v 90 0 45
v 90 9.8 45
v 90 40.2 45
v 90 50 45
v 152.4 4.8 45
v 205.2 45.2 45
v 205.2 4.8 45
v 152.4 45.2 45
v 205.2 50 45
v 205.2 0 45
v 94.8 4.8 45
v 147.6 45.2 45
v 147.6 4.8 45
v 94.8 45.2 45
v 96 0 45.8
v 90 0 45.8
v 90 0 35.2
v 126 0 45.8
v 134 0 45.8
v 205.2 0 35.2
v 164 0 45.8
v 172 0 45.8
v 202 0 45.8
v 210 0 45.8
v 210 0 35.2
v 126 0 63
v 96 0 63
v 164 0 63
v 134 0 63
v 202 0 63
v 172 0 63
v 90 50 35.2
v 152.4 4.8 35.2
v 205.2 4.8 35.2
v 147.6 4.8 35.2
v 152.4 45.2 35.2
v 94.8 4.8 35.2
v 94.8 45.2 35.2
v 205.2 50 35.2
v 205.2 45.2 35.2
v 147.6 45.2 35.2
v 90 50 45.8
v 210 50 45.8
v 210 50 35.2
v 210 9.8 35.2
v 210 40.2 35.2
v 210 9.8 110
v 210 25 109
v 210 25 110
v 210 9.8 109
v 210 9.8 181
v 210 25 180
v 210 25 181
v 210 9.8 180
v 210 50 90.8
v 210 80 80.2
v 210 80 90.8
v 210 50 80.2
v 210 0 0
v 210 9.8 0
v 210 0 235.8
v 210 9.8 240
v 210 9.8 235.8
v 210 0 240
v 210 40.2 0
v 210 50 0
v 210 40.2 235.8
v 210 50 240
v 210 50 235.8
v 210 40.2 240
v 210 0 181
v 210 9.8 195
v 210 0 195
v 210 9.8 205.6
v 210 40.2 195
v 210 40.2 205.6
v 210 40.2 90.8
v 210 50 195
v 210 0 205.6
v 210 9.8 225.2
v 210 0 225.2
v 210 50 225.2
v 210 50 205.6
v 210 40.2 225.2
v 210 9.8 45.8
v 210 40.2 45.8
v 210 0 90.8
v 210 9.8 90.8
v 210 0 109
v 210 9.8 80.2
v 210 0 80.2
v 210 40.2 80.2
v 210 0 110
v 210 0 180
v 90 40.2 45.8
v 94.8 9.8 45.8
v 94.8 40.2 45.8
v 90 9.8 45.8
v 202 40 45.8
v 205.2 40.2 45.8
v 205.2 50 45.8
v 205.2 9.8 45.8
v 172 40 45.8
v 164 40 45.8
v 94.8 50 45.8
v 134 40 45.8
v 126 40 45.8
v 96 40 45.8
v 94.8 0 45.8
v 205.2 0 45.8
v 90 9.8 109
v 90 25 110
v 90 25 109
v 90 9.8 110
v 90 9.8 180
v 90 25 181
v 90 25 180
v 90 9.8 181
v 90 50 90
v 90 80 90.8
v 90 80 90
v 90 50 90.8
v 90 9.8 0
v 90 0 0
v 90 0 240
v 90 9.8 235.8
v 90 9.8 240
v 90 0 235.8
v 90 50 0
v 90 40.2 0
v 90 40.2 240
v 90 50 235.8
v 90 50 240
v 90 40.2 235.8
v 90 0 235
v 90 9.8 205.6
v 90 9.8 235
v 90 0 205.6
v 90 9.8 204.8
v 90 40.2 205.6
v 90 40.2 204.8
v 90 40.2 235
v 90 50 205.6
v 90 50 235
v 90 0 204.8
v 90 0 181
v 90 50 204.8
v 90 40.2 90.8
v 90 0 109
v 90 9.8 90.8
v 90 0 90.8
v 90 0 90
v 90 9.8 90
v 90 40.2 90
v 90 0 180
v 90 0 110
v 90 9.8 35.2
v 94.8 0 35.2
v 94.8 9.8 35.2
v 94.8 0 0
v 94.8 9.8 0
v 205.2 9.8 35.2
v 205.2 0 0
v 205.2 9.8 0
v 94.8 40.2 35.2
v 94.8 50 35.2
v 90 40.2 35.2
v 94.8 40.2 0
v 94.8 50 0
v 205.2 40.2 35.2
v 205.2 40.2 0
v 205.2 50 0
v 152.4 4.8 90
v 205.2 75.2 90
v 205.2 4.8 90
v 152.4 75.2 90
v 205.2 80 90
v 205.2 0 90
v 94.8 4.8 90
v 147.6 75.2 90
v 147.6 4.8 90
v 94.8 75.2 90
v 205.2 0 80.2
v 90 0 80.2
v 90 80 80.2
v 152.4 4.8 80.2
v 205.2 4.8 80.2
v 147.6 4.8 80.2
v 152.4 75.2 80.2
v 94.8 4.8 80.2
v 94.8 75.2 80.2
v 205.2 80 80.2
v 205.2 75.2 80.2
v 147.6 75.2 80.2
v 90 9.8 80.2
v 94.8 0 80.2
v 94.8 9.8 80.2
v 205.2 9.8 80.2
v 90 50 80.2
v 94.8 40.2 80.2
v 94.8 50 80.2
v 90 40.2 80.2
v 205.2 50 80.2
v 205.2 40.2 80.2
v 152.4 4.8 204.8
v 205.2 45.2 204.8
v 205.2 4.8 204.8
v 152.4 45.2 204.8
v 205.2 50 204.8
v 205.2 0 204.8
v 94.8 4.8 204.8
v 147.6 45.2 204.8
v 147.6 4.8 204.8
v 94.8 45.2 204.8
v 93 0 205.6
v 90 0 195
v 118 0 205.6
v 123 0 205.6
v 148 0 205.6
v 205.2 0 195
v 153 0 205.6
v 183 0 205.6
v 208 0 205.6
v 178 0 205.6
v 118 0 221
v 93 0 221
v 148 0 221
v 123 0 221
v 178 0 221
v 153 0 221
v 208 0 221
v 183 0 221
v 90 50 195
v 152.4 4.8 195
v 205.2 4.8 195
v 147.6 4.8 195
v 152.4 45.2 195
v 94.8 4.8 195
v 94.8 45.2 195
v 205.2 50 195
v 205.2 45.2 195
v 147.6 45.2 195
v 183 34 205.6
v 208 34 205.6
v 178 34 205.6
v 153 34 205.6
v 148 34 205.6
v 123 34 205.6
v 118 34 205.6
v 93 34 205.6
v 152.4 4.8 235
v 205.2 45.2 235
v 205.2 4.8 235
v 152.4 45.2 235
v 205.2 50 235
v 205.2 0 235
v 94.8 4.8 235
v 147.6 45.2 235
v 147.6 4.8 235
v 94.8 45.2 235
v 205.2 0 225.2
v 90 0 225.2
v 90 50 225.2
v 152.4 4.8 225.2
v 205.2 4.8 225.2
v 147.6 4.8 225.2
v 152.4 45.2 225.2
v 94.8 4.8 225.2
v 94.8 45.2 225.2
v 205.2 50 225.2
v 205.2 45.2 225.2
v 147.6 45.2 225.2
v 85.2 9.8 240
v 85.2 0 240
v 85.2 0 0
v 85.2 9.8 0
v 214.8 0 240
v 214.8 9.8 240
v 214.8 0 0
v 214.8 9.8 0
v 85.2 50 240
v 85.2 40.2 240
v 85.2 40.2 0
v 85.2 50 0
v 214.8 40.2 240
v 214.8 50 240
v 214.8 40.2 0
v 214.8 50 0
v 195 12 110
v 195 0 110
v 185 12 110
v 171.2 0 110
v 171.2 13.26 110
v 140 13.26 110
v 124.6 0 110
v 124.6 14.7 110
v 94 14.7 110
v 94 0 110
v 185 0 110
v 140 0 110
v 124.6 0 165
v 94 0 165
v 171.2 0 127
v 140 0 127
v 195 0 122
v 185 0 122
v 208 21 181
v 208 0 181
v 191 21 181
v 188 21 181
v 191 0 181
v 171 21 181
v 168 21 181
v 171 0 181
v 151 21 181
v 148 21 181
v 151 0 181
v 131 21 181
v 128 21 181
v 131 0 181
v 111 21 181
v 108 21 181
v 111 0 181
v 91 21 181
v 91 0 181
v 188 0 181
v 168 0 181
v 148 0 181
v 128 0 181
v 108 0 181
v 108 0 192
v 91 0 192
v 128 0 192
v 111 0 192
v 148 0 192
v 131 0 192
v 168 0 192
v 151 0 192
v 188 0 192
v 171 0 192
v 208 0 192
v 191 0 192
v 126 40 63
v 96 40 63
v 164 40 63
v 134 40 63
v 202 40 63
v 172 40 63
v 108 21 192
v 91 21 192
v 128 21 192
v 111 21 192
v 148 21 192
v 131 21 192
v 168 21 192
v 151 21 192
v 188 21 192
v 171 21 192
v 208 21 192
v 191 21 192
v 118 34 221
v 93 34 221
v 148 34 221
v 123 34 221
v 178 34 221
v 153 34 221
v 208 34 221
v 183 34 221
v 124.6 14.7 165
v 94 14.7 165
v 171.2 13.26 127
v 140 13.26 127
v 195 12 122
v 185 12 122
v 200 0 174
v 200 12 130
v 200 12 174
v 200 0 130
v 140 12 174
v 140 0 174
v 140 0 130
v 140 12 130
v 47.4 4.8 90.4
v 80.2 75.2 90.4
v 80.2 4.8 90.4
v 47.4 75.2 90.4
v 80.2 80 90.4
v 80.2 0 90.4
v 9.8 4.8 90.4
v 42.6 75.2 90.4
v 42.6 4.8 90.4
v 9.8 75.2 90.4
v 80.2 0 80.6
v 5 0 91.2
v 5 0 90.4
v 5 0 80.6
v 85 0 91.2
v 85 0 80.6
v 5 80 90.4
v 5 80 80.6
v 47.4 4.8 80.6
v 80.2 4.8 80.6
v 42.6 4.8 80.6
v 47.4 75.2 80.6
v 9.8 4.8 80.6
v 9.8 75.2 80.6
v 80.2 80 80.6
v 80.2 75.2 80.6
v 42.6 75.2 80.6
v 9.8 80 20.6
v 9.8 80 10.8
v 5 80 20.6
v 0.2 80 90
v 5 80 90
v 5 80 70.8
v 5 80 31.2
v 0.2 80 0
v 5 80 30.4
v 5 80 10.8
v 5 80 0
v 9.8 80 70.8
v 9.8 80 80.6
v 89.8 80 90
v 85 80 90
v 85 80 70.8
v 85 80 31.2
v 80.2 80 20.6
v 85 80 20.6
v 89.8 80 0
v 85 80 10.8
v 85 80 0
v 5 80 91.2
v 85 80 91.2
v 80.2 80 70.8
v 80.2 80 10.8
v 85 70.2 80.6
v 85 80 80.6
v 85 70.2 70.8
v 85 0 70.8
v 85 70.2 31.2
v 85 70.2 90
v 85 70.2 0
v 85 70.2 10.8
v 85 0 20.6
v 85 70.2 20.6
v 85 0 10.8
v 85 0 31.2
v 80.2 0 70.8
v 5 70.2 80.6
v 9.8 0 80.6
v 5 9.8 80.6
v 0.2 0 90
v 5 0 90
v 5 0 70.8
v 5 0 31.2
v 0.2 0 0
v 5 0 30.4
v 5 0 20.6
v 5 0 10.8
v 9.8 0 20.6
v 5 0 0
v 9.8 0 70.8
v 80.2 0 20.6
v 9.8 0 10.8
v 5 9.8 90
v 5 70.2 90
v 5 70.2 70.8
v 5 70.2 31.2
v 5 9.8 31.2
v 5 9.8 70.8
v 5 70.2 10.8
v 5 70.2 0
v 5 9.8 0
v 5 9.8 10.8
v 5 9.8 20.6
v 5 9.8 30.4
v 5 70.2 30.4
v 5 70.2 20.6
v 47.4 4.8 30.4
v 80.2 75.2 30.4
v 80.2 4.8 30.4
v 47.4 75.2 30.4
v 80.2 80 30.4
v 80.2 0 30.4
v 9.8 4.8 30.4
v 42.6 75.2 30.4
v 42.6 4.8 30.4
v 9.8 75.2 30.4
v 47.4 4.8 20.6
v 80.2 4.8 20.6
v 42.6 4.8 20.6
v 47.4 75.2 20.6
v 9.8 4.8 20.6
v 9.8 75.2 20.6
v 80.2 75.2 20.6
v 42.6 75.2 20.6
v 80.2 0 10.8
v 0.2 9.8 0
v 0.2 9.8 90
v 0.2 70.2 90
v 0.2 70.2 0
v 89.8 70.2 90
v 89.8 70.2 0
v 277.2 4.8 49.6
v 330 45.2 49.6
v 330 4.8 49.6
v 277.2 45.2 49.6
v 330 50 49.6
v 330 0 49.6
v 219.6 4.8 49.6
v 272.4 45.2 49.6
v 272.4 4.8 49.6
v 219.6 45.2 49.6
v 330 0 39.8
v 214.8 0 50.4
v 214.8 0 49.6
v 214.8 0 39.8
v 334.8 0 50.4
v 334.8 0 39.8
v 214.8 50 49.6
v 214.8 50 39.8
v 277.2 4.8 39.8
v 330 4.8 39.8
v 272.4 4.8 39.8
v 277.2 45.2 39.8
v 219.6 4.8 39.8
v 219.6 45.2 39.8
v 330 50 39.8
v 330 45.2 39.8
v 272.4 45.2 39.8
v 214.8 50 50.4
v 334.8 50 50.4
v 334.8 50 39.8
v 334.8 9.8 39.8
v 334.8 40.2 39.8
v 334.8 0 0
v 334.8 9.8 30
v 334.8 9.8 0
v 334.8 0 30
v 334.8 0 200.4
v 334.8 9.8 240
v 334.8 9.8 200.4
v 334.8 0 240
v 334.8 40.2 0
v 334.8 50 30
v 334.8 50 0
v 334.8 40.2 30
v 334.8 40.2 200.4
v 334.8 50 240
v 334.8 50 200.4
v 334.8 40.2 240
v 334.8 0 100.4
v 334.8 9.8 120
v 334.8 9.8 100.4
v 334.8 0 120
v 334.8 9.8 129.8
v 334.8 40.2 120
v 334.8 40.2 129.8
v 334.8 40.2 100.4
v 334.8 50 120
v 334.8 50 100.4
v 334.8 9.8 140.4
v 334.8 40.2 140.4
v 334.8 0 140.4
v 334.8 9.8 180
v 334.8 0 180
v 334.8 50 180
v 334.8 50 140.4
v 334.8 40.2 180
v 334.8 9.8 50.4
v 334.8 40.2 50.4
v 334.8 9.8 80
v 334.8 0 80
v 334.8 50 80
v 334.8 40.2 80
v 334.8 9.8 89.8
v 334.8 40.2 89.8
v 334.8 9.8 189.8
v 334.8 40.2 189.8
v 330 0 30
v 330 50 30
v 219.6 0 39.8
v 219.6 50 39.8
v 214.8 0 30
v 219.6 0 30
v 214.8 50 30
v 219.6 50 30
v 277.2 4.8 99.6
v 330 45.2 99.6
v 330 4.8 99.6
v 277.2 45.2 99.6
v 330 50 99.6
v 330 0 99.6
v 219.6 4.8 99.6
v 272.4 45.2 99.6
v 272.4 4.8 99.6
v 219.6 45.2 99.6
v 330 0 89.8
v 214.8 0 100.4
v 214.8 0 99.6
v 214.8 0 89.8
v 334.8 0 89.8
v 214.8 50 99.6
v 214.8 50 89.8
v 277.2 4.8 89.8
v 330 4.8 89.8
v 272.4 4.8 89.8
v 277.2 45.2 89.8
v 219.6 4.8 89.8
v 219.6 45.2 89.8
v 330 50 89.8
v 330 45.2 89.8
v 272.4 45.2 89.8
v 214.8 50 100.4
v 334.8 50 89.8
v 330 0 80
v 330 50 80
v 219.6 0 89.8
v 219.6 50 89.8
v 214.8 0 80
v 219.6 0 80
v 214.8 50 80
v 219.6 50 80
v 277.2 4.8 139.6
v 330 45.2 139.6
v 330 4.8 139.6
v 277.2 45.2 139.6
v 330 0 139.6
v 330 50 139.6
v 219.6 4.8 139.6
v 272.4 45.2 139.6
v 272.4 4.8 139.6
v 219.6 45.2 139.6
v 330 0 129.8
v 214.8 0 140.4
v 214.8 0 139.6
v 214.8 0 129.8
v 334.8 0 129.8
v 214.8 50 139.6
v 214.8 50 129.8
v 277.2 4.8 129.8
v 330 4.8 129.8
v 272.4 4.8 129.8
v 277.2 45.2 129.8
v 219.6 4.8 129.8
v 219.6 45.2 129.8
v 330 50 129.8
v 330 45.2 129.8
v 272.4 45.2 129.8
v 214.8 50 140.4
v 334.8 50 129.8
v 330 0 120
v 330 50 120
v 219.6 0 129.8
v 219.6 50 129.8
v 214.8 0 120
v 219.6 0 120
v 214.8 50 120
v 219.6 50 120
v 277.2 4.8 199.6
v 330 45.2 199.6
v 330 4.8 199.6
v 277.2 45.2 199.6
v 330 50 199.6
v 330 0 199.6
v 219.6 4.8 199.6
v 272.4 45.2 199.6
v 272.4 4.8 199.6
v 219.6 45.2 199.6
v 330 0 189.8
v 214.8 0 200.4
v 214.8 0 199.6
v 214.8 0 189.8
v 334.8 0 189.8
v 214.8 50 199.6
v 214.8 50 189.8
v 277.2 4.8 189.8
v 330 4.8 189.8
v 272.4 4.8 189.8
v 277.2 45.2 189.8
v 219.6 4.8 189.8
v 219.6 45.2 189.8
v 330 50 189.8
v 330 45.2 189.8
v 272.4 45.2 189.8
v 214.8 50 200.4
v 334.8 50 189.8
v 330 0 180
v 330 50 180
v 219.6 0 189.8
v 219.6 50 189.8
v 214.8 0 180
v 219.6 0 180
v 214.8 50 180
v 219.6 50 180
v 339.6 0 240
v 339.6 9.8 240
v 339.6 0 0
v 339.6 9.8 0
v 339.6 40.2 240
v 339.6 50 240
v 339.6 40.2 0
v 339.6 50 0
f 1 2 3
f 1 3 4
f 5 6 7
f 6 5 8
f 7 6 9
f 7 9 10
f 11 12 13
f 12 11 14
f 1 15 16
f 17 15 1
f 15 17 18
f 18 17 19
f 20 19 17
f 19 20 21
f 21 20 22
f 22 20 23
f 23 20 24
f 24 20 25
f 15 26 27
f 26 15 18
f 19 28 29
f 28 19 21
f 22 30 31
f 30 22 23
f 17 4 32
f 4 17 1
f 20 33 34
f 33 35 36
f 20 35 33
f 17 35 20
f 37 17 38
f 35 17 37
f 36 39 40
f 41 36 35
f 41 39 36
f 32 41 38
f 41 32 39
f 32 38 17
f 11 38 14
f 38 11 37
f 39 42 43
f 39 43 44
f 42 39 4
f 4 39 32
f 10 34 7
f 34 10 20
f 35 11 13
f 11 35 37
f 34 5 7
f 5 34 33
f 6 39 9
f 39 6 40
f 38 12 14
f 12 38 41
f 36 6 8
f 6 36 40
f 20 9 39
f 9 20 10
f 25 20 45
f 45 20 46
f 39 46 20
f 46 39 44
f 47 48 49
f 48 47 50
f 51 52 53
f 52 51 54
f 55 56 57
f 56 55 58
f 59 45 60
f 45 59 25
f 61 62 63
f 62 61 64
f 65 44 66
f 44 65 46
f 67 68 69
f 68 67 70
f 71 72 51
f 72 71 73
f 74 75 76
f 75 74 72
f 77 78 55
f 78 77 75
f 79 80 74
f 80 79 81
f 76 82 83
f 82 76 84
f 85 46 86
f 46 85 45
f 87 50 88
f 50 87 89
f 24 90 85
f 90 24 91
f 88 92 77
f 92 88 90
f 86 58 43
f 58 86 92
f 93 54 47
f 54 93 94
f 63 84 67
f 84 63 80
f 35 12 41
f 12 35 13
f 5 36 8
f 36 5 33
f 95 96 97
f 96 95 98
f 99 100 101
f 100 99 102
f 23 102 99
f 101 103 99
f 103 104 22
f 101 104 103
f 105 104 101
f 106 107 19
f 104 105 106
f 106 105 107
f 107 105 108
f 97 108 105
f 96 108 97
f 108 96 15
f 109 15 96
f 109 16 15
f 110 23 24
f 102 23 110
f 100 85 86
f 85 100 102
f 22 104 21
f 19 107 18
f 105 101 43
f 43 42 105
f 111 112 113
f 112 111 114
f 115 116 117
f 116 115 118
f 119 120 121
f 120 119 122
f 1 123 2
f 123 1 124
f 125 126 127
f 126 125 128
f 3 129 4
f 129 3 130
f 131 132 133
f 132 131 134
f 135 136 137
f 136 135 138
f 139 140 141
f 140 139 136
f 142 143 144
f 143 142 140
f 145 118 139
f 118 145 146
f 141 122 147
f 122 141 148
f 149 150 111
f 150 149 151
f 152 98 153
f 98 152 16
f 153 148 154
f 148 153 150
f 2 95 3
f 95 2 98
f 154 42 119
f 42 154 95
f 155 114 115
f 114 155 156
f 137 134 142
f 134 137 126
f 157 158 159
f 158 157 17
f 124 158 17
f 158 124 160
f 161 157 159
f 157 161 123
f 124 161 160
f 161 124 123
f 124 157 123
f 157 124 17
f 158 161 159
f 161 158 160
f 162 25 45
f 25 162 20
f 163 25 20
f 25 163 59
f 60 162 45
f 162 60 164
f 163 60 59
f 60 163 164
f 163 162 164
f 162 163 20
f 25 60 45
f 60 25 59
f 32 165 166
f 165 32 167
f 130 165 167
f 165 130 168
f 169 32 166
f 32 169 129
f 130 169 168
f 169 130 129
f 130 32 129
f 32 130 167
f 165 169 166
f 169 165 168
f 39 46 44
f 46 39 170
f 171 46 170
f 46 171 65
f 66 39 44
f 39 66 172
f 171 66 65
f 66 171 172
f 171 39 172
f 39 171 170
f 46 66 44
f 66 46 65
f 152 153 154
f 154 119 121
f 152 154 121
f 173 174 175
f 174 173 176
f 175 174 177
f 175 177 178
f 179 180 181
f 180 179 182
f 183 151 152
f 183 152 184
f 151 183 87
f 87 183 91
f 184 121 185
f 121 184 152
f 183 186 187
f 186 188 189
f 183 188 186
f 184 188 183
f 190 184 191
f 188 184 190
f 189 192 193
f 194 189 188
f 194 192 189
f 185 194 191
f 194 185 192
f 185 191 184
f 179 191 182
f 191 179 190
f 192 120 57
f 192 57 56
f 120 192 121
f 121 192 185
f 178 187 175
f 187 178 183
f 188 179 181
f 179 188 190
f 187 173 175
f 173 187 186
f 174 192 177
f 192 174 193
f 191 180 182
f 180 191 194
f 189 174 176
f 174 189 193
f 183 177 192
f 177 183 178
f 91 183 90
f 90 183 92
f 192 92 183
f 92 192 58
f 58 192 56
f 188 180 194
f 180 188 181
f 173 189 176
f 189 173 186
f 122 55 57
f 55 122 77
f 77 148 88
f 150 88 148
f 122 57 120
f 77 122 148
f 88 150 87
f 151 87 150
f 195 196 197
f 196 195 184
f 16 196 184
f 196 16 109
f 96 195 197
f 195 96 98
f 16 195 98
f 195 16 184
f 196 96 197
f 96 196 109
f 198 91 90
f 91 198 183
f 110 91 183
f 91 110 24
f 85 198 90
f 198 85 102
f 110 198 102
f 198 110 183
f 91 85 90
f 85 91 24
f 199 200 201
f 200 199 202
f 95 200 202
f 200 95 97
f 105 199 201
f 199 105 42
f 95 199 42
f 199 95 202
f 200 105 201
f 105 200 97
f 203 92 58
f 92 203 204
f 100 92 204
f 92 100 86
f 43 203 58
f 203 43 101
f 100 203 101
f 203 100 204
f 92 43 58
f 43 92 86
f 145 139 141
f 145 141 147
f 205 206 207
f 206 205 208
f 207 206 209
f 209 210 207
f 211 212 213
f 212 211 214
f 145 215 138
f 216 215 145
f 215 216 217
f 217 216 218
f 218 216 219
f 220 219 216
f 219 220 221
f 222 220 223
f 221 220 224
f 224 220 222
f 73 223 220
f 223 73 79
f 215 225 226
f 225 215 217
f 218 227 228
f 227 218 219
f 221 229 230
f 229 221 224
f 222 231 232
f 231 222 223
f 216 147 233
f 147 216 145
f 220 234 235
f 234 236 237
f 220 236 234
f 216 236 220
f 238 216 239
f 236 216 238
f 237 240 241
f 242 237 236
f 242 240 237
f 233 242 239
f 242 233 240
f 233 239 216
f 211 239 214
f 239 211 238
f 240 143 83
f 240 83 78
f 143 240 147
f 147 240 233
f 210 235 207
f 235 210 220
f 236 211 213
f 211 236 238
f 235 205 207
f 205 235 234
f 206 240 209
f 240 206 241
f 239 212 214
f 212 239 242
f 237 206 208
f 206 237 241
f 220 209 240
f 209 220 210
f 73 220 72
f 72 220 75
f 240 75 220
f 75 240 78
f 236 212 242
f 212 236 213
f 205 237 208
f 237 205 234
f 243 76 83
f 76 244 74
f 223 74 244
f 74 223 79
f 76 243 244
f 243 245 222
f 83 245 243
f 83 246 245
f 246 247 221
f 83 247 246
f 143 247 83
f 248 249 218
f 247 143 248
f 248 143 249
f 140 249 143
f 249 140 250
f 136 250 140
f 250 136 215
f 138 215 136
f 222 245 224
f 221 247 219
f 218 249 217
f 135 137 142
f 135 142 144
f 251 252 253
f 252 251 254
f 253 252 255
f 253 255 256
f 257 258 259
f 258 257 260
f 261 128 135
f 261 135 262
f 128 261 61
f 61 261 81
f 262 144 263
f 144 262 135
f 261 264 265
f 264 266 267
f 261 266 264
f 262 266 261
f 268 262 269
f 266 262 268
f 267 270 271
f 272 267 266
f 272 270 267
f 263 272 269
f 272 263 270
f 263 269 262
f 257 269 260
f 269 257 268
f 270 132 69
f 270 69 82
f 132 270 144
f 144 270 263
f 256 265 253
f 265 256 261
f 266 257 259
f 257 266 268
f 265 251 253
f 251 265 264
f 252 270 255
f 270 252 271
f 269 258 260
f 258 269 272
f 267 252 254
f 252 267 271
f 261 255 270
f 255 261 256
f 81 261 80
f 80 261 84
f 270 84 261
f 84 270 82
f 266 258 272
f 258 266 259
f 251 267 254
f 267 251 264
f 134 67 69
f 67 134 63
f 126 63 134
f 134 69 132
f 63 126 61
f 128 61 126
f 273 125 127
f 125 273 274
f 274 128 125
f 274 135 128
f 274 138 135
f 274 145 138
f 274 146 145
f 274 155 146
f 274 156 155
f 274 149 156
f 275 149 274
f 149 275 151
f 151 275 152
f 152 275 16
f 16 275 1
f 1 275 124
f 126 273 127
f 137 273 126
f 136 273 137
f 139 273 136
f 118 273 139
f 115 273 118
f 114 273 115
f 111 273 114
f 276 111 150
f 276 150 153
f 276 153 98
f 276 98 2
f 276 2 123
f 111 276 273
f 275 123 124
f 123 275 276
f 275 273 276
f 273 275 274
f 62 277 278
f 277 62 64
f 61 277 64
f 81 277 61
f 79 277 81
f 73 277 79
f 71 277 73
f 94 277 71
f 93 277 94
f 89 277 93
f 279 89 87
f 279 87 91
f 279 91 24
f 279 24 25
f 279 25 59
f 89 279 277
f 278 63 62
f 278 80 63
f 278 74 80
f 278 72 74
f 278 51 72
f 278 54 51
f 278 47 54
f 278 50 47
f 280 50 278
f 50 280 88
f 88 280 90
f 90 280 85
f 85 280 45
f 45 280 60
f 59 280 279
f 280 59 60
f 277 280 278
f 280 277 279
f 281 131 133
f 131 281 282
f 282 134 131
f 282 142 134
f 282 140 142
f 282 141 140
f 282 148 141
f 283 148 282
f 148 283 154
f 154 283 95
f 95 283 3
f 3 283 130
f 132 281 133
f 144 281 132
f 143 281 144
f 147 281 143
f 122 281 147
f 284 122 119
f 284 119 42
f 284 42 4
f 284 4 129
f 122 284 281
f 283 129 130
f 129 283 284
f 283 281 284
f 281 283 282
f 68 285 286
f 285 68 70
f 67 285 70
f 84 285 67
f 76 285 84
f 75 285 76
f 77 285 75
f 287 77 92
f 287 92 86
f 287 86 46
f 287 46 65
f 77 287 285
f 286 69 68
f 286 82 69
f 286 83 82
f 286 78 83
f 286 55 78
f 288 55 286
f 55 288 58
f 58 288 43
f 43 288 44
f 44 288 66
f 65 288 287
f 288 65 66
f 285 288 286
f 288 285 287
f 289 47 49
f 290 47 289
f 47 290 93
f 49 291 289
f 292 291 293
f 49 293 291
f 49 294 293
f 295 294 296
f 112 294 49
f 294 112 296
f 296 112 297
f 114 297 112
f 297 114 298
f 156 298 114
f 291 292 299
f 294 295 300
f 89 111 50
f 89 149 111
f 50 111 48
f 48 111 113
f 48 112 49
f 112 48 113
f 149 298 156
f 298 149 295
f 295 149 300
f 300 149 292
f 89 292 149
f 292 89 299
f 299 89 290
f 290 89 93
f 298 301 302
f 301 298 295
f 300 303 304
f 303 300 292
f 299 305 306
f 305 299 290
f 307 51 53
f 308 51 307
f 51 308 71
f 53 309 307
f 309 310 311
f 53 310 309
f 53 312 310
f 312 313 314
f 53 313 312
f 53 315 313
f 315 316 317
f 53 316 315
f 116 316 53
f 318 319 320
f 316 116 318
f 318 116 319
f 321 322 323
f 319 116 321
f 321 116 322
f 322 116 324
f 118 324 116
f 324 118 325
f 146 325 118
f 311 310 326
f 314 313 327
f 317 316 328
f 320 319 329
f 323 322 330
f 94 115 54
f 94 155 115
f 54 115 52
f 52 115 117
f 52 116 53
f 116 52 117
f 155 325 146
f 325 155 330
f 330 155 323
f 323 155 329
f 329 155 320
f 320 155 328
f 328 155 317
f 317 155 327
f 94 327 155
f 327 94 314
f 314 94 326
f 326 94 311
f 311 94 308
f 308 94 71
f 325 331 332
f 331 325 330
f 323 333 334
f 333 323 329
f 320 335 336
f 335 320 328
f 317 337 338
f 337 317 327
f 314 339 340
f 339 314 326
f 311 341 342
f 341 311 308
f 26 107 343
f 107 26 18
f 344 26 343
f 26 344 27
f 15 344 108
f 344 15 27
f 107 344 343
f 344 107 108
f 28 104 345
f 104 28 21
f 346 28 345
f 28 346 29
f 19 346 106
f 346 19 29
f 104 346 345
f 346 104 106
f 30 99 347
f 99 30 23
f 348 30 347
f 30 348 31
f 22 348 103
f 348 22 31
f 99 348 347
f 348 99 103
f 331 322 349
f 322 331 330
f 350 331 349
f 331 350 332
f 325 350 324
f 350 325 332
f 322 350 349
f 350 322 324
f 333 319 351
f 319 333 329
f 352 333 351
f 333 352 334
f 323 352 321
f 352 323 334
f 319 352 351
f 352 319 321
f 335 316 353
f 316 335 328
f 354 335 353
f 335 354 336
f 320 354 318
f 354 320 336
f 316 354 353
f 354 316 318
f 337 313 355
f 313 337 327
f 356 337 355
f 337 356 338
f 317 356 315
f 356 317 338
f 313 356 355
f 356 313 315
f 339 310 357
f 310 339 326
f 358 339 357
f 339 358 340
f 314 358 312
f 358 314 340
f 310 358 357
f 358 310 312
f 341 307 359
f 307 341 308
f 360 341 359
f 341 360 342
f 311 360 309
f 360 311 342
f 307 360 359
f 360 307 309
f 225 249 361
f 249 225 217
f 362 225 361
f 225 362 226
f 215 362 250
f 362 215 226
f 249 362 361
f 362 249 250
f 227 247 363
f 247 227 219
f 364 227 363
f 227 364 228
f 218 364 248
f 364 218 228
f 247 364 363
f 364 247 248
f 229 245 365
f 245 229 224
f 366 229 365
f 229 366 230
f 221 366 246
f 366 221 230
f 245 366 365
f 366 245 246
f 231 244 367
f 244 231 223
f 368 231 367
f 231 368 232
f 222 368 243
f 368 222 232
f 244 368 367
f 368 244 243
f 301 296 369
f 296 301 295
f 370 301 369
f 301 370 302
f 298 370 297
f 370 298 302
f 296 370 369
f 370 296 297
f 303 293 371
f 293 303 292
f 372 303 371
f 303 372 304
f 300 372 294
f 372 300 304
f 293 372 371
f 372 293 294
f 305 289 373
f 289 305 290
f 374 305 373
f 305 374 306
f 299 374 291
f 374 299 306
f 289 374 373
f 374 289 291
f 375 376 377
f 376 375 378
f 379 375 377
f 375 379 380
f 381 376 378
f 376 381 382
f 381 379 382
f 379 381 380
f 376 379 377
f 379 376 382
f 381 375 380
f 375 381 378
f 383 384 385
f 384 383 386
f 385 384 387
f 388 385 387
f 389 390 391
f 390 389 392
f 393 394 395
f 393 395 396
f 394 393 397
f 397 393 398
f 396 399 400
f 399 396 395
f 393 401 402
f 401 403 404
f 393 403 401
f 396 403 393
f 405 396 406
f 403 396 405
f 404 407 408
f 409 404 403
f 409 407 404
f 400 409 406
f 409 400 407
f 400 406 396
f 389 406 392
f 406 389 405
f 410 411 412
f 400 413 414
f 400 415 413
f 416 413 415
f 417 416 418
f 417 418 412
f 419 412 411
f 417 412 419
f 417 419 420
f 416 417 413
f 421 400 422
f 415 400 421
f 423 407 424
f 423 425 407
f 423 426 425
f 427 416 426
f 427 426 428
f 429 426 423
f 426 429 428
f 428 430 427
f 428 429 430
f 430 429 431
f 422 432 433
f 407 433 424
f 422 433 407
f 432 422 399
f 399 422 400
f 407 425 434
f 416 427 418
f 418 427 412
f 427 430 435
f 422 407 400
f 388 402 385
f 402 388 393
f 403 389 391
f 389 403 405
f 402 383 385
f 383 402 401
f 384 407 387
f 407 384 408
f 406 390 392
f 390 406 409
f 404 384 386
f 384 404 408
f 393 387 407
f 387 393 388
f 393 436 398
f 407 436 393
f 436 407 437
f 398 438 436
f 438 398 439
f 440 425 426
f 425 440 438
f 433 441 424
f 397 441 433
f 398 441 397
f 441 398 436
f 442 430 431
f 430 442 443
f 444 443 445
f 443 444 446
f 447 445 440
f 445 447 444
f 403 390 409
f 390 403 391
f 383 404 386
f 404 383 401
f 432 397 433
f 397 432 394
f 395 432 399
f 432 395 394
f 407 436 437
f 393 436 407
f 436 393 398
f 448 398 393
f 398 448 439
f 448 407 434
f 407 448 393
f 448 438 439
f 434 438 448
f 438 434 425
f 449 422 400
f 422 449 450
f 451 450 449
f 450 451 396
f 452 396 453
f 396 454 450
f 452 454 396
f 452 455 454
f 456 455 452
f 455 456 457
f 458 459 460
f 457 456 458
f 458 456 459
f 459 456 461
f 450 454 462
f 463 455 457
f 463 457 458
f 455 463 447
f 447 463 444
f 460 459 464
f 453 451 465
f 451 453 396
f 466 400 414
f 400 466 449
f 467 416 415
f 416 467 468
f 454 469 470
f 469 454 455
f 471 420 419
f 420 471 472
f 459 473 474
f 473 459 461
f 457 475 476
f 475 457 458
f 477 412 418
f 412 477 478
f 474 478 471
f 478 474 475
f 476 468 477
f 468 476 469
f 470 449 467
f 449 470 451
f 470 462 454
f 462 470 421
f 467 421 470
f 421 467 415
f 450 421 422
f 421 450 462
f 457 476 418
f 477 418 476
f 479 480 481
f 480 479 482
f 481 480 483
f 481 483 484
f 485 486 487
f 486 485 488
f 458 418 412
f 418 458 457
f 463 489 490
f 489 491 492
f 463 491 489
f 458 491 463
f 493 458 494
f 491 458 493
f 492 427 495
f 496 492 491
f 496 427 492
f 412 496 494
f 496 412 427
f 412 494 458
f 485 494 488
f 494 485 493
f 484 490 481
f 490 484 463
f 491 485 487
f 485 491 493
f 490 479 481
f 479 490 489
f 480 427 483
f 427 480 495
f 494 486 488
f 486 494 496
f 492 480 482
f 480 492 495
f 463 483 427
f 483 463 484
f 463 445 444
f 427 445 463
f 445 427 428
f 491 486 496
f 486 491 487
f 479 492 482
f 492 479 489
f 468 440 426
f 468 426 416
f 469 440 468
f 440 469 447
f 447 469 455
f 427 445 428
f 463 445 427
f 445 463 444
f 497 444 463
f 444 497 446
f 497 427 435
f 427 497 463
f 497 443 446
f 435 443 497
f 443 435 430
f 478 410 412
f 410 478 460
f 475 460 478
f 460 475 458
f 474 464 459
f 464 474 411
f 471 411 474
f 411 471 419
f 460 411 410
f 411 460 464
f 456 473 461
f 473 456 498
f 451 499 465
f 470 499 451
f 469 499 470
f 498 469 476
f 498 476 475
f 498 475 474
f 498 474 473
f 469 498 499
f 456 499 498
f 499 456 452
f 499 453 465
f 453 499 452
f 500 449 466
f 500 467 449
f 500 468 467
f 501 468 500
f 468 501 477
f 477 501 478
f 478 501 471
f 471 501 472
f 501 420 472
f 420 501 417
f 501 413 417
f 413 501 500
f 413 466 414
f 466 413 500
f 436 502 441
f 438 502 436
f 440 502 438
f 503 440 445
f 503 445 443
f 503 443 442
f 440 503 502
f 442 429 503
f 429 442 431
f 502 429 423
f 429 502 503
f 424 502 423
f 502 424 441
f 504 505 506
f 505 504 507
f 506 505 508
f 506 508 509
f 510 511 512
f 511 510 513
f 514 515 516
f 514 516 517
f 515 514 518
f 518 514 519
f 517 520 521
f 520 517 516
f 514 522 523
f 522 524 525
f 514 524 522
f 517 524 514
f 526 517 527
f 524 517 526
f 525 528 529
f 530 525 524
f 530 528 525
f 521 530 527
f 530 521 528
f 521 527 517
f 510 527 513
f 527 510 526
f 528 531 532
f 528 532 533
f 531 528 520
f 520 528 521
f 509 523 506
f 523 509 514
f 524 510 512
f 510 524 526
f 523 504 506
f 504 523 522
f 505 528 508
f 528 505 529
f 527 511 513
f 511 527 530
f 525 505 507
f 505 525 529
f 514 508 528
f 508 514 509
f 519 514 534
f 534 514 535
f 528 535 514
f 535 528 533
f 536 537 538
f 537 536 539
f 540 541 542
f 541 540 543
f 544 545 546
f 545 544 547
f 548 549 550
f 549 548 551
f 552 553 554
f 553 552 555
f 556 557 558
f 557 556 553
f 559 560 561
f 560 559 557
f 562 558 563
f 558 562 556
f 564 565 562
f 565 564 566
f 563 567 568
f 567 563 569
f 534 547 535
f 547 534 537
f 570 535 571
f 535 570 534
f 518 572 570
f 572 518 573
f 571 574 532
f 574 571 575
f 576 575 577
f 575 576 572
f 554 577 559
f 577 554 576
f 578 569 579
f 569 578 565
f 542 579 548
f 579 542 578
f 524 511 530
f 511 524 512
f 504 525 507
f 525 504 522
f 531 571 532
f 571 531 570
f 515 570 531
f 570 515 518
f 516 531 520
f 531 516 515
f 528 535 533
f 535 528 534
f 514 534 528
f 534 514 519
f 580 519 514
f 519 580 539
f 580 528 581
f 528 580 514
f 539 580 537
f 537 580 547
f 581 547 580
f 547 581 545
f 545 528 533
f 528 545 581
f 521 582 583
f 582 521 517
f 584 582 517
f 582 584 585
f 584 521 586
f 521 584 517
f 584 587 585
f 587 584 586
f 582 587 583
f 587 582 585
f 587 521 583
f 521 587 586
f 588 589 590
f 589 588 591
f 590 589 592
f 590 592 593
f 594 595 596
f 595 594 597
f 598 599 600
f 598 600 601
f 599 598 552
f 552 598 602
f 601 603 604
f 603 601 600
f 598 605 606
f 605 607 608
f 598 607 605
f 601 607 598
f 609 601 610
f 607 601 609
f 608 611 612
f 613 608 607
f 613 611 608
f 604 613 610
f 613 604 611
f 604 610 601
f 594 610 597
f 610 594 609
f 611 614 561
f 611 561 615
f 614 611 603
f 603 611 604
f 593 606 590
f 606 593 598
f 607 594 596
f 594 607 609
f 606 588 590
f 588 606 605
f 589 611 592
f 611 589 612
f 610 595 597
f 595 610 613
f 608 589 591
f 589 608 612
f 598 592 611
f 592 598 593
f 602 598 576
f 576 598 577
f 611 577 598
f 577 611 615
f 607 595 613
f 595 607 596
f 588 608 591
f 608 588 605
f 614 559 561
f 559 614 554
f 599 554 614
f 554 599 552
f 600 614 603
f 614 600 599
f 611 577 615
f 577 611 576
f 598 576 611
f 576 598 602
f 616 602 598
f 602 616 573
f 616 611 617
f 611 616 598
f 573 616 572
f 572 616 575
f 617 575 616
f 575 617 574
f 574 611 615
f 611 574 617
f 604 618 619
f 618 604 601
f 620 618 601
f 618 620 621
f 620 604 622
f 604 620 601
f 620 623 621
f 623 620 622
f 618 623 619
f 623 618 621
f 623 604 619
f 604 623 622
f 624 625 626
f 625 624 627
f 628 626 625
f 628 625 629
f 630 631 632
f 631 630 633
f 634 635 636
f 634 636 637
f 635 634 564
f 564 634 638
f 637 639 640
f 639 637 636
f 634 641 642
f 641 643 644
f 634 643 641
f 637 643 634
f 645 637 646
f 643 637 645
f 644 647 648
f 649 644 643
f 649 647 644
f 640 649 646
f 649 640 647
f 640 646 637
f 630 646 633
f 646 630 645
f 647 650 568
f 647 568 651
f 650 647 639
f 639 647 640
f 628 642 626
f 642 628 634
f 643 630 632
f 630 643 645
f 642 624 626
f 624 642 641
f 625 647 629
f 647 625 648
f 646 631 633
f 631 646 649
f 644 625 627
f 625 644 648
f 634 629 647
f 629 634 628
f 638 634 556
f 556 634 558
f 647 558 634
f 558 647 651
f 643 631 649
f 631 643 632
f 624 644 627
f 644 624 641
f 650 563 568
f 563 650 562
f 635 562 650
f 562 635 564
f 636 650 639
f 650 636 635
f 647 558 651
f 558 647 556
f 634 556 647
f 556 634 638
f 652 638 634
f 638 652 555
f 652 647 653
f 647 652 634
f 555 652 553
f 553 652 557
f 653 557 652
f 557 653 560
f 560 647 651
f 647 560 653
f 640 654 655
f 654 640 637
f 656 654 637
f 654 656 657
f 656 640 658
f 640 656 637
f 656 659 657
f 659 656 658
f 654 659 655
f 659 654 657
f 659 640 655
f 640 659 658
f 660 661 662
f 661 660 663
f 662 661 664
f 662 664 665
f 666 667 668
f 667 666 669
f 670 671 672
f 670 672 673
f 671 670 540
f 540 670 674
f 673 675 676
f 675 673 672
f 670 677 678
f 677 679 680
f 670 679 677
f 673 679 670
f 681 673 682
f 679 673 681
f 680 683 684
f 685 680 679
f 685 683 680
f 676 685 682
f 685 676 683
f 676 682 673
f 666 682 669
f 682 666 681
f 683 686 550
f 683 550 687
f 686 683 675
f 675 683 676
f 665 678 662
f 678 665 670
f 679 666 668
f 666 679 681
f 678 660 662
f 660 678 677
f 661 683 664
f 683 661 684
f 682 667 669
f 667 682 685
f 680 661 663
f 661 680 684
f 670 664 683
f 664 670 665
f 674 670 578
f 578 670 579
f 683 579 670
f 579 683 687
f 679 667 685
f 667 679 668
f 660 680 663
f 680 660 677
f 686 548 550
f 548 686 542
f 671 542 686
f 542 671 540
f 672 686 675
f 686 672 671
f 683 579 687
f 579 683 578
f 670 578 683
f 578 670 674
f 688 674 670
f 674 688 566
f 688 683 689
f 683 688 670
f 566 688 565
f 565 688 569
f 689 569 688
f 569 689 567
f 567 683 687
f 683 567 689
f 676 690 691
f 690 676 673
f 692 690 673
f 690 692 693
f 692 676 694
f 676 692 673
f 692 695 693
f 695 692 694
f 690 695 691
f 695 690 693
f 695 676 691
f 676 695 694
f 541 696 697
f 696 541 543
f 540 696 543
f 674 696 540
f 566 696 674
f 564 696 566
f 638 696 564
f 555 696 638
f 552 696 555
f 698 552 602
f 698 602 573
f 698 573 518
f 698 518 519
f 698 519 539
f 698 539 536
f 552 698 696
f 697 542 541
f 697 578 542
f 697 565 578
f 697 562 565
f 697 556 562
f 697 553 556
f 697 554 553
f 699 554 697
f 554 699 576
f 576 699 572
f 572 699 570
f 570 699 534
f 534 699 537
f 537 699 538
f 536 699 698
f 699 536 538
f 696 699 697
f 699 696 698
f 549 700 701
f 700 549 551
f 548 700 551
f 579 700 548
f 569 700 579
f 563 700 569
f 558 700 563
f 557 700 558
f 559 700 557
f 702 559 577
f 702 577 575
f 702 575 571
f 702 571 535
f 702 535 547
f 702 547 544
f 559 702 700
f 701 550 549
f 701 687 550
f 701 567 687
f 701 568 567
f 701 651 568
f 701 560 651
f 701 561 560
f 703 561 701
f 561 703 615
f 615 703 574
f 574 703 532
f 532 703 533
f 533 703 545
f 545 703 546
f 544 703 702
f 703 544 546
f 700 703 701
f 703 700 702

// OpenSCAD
// file: components.scad
use <materials.scad>;

module support(width, depth) {
    // Calculate number of support beams
    beams = ceil(max(2, (width / 60) + 1));
    echo(beams);

    translate([4.8, 0, 0])
    {
        rotate([0, 0, 90])
            twobyfour(depth);
        twobyfour(width - 2 * 4.8);
        translate([0, depth - 4.8, 0])
            twobyfour(width - 2 * 4.8);
    }
    translate([width, 0, 0])
        rotate([0, 0, 90])
            twobyfour(depth);

    beamdelta = width / (beams - 1);
    for(beam = [1:beams - 2]) {
        translate([beamdelta * beam + 2.4, 4.8, 0])
            rotate([0, 0, 90])
                twobyfour(depth - 2 * 4.8);
    }
}

module shelf(width, depth) {
    cube([width, depth, .8]);
}

module shelfwithsupport(width, depth) {
    support(width, depth);
    translate([0, 0, 9.8])
    shelf(width, depth);
}

module shelfwithbeams(width, depth) {
    translate([0, 0, 9.8])
        shelfwithsupport(width, depth);

    translate([width, 0, 0])
        rotate(90)
            twobyfour(depth);

    translate([4.8, 0, 0])
        rotate(90)
            twobyfour(depth);
}
// file: smartstore.scad
module smartstore(size=2) {
    color("LightGray", 0.8)
    if(size == 2)
        cube([17, 21, 11]);
    
    else if(size == 10)
        cube([25, 34, 16]);

    else if(size == 15)
        cube([30, 40, 18]);
}
// file: materials.scad
module twobyfour(length) {
    color("BurlyWood")
    cube([length, 4.8, 9.8]);   
}
// file: tools.scad
module oscilloskop() {
    color("Gray")
    cube([31.2, 13.26, 17]);
}

module sortimentskuff() {
    color("Gray")
    cube([30.6, 14.7, 55]);
}

module hakko_base() {
    color("Blue")
    cube([10, 12, 12]);
}

module dataskjerm() {
    color("Black")
    cube([60, 12, 44]);
}
// file: shelves.scad
use <materials.scad>
use <components.scad>

module shelves() {
    translate([0, 0, 30])
        shelfwithbeams(120, 50);
    translate([0, 0, 80])
        shelfwithbeams(120, 50);
    translate([0, 0, 120])
        shelfwithbeams(120, 50);
    translate([0, 0, 180])
        shelfwithbeams(120, 50);

    translate([0, 9.8, 0])
        rotate([90, -90, 0]) {
            translate([0, -120 - 4.8, 0])
                twobyfour(240);
            
            translate([0, -120 - 4.8, -50 + 9.8])
                twobyfour(240);
        }
}
// file: printertable.scad
use <components.scad>;
use <materials.scad>;

module printertable() {
    translate([0, 9.8, 0])
        rotate([90, -90, 0])
            twobyfour(90);

    translate([0, 80, 0])
        rotate([90, -90, 0])
            twobyfour(90);

    translate([80 + 4.8, 80, 0])
        rotate([90, -90, 0])
            twobyfour(90);


    translate([0, 0, 90 - 9.6 * 2])
        shelfwithbeams(80, 80);

    translate([0, 0, 30 - 9.6 * 2])
        shelfwithbeams(80, 80);

}
// file: desk.scad
use <tools.scad>;
use <materials.scad>;
use <smartstore.scad>;
use <components.scad>;

module desk(width) {
    // Workbench lower shelf
    translate([0, 0, 45 - 9.8])
        shelfwithsupport(120, 50);

    // Bottom vertical supports
    translate([4.8, 9.8, 0])
        rotate([90, -90, 0]) {
            twobyfour(45 - 9.8);
            translate([0, -120 + 4.8, 0])
                twobyfour(45 - 9.8);
            
            translate([0, 0, -50 + 9.8])
                twobyfour(45 - 9.8);
        
            translate([0, -120 + 4.8, -50 + 9.8])
                twobyfour(45 - 9.8);
        }

    // Workbench main desk
    translate([0, 0, 90 - 9.8])
        shelfwithsupport(120, 80);

    // Main desk vertical supports
    translate([4.8, 9.8, 45])
        rotate([90, -90, 0]) {
            twobyfour(45 - 9.8);
            translate([0, -120 + 4.8, 0])
                twobyfour(45 - 9.8);
            
            translate([0, 0, -50 + 9.8])
                twobyfour(45 - 9.8);
        
            translate([0, -120 + 4.8, -50 + 9.8])
                twobyfour(45 - 9.8);
        }
    
    translate([0, 0, 195])
        shelfwithsupport(120, 50);

    translate([0, 0, 235 - 9.8])
        shelfwithsupport(120, 50);

    translate([0, 0, 109])
        cube([120, 25, 1]);

    translate([0, 0, 180])
        cube([120, 25, 1]);

// Main veritcal beams
    translate([0, 9.8, 0])
        rotate([90, -90, 0]) {
            twobyfour(240);
            translate([0, -120 - 4.8, 0])
                twobyfour(240);
            
            translate([0, 0, -50 + 9.8])
                twobyfour(240);
        
            translate([0, -120 - 4.8, -50 + 9.8])
                twobyfour(240);
        }
}



module stuffondesk() {
    /* Add some tools to see how it all looks */
    translate([4, 0, 110])
    sortimentskuff();

    translate([50, 0, 110])
    oscilloskop();

    translate([95, 0, 110])
    hakko_base();

    translate([50, 0, 130])
    dataskjerm();

    translate([6, 0, 45]) {
        for(box = [0:2])
            translate([box * 38, 0, 0])
                smartstore(size=15);
    }

    translate([1, 0, 181]) {
        for(box = [0:5])
            translate([box * 20, 0, 0])
            smartstore(size=2);
    }

    translate([3, 0, 205]) {
        for(box = [0:3])
            translate([box * 30, 0, 0])
            smartstore(size=10);
    }
}

desk();
stuffondesk();
// main file
use <desk.scad>;
use <printertable.scad>;
use <shelves.scad>;

// Floor
translate([0, 0, -1])
    %cube([352, 348, 1]);

// Wall
translate([0, -1, 0])
        %cube([352, 1, 256]);


translate([352, 0, 0])
    rotate([0, 0, 90])
        %difference() {
            cube([348, 1, 256]);
            translate([175, -1, 0])
                cube([80, 5, 200]);
        }

translate([0, 0, 0])
    rotate([0, 0, 90])
        %difference() {
            cube([348, 1, 256]);
            translate([10, -1, 94])
                cube([110, 5, 100]);
            translate([130, -1, 94])
                cube([110, 5, 100]);
        }



translate([90, 0, 0]) {
    desk();
    stuffondesk();
}

translate([5, 0, 0]) {
    printertable();
}

translate([210 + 4.8, 0, 0]) {
    shelves();
}
